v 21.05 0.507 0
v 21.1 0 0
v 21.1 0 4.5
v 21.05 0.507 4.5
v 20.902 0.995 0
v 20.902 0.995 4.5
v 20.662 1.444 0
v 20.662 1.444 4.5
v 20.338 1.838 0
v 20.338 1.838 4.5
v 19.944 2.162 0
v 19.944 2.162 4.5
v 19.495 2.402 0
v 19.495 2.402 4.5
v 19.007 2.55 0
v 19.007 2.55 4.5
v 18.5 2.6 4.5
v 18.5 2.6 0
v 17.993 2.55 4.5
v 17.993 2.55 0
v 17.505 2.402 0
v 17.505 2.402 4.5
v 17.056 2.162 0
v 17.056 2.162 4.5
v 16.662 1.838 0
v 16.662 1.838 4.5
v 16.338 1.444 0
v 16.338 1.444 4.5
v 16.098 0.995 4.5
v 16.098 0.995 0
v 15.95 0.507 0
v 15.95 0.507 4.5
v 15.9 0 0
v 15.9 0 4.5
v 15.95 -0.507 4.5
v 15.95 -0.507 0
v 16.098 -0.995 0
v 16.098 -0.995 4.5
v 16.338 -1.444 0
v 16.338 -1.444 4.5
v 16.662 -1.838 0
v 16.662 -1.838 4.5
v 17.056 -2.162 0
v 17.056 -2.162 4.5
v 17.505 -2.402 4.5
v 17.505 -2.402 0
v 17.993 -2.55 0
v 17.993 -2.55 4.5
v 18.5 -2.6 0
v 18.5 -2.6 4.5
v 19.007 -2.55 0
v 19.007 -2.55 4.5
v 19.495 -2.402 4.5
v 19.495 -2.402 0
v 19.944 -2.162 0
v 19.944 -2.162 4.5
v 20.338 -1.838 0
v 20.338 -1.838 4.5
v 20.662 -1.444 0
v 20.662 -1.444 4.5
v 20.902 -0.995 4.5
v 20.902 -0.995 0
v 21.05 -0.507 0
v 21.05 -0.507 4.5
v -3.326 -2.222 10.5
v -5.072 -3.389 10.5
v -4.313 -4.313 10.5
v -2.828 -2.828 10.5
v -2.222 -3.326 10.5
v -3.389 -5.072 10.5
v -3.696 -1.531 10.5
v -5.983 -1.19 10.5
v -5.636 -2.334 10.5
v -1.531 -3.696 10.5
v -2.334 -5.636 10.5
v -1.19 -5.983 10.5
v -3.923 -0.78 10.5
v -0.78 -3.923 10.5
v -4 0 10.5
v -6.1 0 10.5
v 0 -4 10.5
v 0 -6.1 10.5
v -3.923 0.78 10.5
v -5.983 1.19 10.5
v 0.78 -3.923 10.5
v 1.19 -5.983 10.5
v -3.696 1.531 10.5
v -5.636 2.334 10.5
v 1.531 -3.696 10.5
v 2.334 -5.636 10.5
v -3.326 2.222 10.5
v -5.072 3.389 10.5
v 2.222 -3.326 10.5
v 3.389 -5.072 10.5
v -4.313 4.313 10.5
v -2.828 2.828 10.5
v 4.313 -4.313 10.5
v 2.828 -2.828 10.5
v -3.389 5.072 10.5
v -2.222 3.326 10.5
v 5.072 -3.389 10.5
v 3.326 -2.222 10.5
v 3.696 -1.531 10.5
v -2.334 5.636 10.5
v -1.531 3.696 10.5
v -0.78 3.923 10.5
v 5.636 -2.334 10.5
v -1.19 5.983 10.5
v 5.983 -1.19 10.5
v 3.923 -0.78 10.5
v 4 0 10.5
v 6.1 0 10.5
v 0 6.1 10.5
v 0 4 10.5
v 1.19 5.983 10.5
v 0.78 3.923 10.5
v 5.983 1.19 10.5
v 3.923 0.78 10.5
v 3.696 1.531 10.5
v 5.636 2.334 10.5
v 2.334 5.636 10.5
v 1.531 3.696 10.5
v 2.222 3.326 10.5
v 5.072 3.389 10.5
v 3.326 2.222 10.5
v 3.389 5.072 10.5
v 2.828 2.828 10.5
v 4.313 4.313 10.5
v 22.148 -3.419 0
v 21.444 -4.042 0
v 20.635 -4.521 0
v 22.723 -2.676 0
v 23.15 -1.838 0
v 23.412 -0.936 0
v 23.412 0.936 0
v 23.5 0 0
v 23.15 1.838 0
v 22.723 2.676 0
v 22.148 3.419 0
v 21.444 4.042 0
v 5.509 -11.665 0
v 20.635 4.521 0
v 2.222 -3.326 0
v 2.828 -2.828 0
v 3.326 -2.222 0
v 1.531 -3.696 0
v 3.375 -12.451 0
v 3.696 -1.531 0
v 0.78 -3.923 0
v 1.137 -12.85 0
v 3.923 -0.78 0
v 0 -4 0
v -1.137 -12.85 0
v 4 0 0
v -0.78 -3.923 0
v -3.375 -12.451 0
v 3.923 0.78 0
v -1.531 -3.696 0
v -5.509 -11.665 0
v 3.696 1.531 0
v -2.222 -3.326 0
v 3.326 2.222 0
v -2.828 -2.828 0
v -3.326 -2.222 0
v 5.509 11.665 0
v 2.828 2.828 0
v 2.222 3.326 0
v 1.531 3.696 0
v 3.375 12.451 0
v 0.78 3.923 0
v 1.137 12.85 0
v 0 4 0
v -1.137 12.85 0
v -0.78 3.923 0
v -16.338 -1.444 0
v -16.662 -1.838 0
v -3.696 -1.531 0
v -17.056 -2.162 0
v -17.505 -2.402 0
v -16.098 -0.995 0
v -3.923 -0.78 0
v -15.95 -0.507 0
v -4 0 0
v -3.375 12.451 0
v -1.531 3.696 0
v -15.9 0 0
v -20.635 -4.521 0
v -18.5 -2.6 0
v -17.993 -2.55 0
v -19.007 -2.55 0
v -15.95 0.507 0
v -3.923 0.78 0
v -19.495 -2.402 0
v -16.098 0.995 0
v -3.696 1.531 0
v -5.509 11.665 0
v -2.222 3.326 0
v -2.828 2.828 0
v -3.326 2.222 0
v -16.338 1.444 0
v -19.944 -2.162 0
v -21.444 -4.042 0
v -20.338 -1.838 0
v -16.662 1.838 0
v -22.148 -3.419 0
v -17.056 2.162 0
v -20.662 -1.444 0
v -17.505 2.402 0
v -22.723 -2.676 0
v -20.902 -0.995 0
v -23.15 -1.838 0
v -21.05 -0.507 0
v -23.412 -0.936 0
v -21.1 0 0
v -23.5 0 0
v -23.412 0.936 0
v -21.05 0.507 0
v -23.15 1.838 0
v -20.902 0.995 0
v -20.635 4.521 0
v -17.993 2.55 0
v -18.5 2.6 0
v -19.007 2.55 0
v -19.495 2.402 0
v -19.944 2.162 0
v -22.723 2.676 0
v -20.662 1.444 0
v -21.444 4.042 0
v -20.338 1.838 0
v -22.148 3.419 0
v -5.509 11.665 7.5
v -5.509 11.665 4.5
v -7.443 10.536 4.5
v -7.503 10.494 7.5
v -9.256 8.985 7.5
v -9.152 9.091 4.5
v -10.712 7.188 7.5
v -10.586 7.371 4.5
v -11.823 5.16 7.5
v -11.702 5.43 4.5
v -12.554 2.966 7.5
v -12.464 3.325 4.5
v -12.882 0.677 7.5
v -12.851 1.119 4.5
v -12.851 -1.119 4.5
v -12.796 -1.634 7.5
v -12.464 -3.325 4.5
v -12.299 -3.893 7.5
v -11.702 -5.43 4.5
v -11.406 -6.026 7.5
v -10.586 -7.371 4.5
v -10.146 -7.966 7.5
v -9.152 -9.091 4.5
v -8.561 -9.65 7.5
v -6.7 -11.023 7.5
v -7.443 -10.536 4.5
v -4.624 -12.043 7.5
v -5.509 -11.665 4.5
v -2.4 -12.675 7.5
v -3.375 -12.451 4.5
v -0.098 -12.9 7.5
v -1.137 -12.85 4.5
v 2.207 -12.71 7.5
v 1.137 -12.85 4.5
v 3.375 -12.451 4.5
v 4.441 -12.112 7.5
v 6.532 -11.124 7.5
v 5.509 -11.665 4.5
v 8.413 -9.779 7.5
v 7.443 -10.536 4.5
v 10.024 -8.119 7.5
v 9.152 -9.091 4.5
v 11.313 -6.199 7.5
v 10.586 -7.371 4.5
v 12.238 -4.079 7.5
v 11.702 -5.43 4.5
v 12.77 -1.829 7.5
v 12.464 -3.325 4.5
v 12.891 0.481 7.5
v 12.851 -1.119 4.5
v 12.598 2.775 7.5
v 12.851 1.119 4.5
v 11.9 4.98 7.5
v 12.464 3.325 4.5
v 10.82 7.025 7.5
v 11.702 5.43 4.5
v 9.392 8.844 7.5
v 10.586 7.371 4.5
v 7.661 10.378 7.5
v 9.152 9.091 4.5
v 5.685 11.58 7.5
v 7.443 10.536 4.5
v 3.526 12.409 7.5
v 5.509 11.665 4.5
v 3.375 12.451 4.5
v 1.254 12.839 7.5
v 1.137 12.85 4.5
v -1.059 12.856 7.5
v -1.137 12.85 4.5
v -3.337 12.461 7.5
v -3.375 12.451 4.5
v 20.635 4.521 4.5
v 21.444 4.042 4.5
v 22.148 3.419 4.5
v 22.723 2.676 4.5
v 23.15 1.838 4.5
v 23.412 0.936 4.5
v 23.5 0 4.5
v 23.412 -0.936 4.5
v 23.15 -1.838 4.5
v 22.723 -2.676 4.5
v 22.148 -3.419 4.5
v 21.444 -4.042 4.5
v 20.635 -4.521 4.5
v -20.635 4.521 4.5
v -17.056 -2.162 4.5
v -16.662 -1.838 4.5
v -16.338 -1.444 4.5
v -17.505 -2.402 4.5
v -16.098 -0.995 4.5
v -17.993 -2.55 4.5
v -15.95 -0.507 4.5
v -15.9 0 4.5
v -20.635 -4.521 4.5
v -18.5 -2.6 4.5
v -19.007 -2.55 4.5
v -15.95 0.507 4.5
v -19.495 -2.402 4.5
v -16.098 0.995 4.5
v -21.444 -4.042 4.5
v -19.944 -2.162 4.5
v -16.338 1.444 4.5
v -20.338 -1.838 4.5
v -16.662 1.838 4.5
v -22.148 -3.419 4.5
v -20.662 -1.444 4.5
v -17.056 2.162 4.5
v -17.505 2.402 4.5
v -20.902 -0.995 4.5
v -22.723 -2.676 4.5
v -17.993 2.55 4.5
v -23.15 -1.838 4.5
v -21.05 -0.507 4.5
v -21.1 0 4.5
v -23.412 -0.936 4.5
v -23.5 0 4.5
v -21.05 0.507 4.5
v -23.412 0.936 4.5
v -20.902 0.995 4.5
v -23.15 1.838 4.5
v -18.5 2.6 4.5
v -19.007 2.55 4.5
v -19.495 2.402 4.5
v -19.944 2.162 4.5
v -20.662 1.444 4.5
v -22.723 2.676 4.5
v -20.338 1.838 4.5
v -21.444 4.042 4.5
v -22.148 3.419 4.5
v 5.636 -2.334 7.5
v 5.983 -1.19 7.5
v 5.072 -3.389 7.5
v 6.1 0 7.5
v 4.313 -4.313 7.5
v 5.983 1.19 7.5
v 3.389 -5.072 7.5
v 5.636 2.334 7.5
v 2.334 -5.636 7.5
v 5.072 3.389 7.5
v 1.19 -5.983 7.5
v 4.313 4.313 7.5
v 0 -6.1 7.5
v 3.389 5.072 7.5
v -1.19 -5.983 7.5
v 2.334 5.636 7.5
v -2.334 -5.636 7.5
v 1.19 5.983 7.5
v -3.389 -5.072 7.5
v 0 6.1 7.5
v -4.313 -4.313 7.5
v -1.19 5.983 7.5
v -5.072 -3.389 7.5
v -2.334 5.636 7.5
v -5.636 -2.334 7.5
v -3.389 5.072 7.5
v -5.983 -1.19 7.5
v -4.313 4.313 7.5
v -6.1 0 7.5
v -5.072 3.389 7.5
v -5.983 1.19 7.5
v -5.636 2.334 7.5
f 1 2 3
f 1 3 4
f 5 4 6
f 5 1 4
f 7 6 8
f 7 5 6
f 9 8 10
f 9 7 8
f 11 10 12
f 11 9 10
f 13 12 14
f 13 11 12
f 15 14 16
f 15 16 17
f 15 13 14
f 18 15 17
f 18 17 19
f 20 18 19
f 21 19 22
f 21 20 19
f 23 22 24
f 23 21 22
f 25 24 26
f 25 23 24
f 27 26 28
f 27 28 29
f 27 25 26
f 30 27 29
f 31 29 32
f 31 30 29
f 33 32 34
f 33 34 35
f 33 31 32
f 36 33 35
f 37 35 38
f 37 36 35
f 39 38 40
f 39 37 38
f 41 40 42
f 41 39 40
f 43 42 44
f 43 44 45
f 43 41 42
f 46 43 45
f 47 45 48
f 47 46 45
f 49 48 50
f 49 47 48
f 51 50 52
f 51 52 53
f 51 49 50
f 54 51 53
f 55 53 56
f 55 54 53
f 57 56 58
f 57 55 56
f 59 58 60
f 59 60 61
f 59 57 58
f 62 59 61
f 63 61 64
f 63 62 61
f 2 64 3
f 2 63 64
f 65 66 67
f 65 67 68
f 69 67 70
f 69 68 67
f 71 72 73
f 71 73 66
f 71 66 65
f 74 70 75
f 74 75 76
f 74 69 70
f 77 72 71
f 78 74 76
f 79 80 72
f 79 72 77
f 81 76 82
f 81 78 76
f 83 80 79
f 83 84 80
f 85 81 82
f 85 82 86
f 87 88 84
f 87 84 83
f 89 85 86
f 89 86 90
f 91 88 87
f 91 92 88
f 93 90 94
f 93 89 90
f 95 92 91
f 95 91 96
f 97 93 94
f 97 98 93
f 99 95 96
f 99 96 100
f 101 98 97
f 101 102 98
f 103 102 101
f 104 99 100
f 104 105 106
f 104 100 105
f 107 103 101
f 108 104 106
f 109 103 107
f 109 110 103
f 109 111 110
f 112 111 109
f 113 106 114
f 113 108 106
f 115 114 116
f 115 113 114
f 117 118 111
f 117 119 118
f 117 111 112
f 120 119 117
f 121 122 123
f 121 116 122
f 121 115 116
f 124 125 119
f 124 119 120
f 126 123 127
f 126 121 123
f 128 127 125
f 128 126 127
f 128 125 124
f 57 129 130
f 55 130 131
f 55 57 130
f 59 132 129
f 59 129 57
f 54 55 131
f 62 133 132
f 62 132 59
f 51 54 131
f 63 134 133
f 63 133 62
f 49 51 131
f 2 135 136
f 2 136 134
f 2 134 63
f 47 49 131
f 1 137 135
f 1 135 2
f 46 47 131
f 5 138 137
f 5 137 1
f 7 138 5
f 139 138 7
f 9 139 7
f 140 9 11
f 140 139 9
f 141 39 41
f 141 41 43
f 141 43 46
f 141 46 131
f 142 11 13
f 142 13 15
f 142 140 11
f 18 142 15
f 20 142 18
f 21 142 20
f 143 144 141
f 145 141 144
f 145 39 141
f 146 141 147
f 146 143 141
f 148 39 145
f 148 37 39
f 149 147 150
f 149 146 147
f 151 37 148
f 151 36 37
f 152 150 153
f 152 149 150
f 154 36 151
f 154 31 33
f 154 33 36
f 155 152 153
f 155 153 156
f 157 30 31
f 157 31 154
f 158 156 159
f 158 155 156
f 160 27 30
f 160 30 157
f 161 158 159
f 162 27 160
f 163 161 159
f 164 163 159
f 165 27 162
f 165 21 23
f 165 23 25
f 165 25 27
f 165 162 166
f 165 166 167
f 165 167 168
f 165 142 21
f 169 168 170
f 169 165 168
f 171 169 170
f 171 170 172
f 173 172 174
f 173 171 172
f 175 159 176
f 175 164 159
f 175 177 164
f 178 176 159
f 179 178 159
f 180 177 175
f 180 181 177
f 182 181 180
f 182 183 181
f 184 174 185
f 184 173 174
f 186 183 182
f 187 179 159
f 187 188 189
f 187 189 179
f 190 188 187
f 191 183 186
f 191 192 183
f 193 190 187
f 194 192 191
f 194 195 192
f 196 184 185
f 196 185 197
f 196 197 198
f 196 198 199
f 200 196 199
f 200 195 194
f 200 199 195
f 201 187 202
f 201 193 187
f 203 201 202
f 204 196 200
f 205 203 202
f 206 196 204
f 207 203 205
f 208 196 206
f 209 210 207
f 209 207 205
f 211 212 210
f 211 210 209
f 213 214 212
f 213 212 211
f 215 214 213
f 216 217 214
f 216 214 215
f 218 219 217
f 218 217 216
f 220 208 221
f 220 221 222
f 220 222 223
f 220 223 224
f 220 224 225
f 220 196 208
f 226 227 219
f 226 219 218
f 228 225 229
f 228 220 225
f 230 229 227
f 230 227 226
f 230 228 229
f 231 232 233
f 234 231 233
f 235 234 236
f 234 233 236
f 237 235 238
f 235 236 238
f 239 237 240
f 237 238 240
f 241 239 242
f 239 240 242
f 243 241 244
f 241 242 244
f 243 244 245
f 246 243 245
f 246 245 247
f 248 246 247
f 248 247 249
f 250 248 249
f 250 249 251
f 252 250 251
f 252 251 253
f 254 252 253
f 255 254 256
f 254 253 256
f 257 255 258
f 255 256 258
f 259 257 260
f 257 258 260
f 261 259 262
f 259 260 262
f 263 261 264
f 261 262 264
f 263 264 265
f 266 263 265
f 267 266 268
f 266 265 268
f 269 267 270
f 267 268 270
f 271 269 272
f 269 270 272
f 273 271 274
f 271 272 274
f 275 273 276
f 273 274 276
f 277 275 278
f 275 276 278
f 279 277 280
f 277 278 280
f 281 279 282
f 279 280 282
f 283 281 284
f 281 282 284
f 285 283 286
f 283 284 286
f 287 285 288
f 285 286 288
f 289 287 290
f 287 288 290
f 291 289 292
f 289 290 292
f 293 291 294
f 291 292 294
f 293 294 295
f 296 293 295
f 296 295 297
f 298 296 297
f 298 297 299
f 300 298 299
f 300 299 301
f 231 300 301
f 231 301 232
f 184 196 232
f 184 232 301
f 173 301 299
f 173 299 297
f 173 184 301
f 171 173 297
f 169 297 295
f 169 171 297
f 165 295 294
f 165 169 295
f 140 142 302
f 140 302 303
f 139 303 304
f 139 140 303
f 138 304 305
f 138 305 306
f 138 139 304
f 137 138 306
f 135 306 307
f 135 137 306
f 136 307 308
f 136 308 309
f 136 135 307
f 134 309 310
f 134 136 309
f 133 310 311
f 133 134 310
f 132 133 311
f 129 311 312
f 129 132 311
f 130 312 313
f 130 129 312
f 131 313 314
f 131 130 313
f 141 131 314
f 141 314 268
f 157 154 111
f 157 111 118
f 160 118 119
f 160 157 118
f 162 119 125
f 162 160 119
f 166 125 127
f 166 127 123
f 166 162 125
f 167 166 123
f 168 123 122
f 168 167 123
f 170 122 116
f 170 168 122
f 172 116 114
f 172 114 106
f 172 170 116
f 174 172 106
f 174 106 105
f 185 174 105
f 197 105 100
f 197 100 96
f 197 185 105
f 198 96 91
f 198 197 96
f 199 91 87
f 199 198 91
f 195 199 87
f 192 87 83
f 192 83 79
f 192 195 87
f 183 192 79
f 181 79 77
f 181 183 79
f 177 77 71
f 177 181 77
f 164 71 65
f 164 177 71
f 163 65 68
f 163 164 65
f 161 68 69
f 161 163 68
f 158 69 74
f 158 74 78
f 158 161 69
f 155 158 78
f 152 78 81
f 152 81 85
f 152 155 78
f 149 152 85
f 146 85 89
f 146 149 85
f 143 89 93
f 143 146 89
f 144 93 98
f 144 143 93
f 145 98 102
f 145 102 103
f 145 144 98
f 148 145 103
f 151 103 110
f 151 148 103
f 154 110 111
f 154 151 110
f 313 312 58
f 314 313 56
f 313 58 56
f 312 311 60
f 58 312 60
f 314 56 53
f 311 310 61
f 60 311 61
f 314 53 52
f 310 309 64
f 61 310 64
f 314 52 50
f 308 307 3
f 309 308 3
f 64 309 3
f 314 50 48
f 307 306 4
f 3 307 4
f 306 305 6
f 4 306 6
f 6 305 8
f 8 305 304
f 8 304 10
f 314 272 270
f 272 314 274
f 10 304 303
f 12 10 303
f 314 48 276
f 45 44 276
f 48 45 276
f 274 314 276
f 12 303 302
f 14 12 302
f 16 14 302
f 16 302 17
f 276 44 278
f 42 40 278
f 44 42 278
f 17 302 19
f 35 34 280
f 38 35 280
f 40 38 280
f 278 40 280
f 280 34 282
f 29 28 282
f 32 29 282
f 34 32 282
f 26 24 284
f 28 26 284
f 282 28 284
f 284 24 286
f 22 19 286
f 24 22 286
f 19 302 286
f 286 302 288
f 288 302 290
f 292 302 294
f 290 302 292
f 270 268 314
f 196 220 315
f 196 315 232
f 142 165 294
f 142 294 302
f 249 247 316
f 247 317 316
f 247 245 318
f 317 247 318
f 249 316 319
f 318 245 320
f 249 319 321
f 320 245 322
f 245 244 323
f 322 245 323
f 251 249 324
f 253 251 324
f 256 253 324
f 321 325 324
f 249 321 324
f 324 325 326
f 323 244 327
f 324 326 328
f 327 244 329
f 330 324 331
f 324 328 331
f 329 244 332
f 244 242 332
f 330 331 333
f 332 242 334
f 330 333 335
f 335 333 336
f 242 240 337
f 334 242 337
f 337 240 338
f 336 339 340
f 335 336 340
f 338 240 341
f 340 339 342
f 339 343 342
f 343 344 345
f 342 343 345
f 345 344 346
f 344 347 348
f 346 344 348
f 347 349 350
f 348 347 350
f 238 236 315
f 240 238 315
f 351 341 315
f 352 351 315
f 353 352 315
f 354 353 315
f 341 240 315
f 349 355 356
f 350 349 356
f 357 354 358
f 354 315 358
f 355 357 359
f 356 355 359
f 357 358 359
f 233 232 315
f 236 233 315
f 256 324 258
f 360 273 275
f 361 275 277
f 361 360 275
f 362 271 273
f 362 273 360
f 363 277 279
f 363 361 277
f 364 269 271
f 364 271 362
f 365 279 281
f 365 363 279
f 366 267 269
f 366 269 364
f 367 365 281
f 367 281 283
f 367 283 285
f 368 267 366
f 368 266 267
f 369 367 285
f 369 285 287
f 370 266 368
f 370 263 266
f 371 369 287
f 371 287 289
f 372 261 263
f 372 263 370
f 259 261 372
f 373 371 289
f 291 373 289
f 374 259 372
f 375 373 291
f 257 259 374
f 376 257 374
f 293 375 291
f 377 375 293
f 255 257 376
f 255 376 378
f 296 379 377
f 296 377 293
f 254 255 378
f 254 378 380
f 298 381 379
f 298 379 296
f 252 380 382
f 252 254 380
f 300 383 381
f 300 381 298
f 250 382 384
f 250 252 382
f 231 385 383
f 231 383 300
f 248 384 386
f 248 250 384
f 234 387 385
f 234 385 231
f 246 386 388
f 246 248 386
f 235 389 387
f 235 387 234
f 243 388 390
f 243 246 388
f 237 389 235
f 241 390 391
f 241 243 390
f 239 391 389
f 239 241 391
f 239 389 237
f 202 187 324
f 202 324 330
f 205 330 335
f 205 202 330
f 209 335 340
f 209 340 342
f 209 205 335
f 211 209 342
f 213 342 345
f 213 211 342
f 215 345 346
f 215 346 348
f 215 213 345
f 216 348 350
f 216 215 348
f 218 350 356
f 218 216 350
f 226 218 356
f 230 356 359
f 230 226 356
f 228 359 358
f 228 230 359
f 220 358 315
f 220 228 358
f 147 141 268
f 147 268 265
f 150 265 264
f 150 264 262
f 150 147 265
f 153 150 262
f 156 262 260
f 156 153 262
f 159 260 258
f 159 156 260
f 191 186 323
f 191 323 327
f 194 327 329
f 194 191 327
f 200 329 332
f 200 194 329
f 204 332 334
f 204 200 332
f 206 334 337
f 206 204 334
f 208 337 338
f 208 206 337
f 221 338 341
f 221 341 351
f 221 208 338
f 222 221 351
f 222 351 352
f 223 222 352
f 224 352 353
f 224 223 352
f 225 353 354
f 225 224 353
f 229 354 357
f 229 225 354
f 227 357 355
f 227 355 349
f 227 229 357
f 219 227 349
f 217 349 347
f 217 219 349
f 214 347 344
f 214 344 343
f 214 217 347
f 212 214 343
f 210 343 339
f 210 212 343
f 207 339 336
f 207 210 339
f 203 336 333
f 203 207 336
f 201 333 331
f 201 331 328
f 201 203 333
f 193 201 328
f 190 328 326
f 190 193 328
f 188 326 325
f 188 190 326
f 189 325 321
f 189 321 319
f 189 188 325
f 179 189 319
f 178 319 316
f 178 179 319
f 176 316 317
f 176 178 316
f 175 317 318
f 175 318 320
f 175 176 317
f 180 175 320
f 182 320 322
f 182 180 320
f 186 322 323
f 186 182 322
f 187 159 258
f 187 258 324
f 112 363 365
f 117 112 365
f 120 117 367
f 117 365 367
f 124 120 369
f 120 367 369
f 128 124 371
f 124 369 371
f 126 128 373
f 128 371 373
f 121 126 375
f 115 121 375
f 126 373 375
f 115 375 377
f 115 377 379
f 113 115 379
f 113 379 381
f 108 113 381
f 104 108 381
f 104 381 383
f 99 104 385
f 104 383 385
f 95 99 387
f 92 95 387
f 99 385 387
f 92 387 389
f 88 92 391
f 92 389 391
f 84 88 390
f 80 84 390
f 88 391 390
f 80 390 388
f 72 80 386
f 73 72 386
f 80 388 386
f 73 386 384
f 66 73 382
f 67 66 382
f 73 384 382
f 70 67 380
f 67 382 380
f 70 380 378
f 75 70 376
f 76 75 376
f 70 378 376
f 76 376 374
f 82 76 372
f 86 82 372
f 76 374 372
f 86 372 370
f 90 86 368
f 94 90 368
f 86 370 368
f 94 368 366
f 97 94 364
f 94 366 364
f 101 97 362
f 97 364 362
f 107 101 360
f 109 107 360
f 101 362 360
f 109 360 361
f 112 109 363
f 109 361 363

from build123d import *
from build123d.topology import SkipClean

# Parameters (mm, degrees)
SKETCH_1_R          = 2.6
EXTRUDE_1_DEPTH     = 4.5
EXTRUDE_START       = 4.5
SKETCH_2_R          = 12.9
EXTRUDE_2_DEPTH     = 3
EXTRUDE_START_2     = 7.5
SKETCH_4_R          = 6.1
EXTRUDE_3_DEPTH     = 3
SKETCH_6_R          = 4
CUT_EXTRUDE_1_DEPTH = 10.5


with BuildPart() as part:
    # 草图1 → 凸台-拉伸1 (new body)
    with BuildSketch(Plane.XY):
        with BuildLine():
            Line((-20.635135135, 4.521194306), (-5.508648649, 11.66468131))
            ThreePointArc((-5.508648649, 11.66468131), (0, 12.9), (5.508648649, 11.66468131))
            Line((5.508648649, 11.66468131), (20.635135135, 4.521194306))
            ThreePointArc((20.635135135, 4.521194306), (23.5, 0), (20.635135135, -4.521194306))
            Line((20.635135135, -4.521194306), (5.508648649, -11.66468131))
            ThreePointArc((5.508648649, -11.66468131), (0, -12.9), (-5.508648649, -11.66468131))
            Line((-5.508648649, -11.66468131), (-20.635135135, -4.521194306))
            ThreePointArc((-20.635135135, -4.521194306), (-23.5, 0), (-20.635135135, 4.521194306))
        make_face()
        with Locations((18.5, 0)):
            Circle(SKETCH_1_R, mode=Mode.SUBTRACT)
        with Locations((-18.5, 0)):
            Circle(SKETCH_1_R, mode=Mode.SUBTRACT)
    extrude(amount=EXTRUDE_1_DEPTH)

    # 草图2 → 凸台-拉伸2 (add)
    with SkipClean():  # the faces are left unmerged after this step: merging them gives an invalid solid
        with BuildSketch(Plane.XY.offset(EXTRUDE_START)):
            with Locations(Location((0, 0, 0), (0, 0, 115.279035224))):
                Circle(SKETCH_2_R)
        extrude(amount=EXTRUDE_2_DEPTH)

    # 草图4 → 凸台-拉伸3 (add)
    with SkipClean():  # the faces are left unmerged after this step: merging them gives an invalid solid
        with BuildSketch(Plane.XY.offset(EXTRUDE_START_2)):
            Circle(SKETCH_4_R)
        extrude(amount=EXTRUDE_3_DEPTH)

    # 草图6 → 切除-拉伸1 (cut)
    with SkipClean():  # the faces are left unmerged after this step: merging them gives an invalid solid
        with BuildSketch(Plane.XY):
            Circle(SKETCH_6_R)
        extrude(amount=CUT_EXTRUDE_1_DEPTH, mode=Mode.SUBTRACT)


solid = part.part
